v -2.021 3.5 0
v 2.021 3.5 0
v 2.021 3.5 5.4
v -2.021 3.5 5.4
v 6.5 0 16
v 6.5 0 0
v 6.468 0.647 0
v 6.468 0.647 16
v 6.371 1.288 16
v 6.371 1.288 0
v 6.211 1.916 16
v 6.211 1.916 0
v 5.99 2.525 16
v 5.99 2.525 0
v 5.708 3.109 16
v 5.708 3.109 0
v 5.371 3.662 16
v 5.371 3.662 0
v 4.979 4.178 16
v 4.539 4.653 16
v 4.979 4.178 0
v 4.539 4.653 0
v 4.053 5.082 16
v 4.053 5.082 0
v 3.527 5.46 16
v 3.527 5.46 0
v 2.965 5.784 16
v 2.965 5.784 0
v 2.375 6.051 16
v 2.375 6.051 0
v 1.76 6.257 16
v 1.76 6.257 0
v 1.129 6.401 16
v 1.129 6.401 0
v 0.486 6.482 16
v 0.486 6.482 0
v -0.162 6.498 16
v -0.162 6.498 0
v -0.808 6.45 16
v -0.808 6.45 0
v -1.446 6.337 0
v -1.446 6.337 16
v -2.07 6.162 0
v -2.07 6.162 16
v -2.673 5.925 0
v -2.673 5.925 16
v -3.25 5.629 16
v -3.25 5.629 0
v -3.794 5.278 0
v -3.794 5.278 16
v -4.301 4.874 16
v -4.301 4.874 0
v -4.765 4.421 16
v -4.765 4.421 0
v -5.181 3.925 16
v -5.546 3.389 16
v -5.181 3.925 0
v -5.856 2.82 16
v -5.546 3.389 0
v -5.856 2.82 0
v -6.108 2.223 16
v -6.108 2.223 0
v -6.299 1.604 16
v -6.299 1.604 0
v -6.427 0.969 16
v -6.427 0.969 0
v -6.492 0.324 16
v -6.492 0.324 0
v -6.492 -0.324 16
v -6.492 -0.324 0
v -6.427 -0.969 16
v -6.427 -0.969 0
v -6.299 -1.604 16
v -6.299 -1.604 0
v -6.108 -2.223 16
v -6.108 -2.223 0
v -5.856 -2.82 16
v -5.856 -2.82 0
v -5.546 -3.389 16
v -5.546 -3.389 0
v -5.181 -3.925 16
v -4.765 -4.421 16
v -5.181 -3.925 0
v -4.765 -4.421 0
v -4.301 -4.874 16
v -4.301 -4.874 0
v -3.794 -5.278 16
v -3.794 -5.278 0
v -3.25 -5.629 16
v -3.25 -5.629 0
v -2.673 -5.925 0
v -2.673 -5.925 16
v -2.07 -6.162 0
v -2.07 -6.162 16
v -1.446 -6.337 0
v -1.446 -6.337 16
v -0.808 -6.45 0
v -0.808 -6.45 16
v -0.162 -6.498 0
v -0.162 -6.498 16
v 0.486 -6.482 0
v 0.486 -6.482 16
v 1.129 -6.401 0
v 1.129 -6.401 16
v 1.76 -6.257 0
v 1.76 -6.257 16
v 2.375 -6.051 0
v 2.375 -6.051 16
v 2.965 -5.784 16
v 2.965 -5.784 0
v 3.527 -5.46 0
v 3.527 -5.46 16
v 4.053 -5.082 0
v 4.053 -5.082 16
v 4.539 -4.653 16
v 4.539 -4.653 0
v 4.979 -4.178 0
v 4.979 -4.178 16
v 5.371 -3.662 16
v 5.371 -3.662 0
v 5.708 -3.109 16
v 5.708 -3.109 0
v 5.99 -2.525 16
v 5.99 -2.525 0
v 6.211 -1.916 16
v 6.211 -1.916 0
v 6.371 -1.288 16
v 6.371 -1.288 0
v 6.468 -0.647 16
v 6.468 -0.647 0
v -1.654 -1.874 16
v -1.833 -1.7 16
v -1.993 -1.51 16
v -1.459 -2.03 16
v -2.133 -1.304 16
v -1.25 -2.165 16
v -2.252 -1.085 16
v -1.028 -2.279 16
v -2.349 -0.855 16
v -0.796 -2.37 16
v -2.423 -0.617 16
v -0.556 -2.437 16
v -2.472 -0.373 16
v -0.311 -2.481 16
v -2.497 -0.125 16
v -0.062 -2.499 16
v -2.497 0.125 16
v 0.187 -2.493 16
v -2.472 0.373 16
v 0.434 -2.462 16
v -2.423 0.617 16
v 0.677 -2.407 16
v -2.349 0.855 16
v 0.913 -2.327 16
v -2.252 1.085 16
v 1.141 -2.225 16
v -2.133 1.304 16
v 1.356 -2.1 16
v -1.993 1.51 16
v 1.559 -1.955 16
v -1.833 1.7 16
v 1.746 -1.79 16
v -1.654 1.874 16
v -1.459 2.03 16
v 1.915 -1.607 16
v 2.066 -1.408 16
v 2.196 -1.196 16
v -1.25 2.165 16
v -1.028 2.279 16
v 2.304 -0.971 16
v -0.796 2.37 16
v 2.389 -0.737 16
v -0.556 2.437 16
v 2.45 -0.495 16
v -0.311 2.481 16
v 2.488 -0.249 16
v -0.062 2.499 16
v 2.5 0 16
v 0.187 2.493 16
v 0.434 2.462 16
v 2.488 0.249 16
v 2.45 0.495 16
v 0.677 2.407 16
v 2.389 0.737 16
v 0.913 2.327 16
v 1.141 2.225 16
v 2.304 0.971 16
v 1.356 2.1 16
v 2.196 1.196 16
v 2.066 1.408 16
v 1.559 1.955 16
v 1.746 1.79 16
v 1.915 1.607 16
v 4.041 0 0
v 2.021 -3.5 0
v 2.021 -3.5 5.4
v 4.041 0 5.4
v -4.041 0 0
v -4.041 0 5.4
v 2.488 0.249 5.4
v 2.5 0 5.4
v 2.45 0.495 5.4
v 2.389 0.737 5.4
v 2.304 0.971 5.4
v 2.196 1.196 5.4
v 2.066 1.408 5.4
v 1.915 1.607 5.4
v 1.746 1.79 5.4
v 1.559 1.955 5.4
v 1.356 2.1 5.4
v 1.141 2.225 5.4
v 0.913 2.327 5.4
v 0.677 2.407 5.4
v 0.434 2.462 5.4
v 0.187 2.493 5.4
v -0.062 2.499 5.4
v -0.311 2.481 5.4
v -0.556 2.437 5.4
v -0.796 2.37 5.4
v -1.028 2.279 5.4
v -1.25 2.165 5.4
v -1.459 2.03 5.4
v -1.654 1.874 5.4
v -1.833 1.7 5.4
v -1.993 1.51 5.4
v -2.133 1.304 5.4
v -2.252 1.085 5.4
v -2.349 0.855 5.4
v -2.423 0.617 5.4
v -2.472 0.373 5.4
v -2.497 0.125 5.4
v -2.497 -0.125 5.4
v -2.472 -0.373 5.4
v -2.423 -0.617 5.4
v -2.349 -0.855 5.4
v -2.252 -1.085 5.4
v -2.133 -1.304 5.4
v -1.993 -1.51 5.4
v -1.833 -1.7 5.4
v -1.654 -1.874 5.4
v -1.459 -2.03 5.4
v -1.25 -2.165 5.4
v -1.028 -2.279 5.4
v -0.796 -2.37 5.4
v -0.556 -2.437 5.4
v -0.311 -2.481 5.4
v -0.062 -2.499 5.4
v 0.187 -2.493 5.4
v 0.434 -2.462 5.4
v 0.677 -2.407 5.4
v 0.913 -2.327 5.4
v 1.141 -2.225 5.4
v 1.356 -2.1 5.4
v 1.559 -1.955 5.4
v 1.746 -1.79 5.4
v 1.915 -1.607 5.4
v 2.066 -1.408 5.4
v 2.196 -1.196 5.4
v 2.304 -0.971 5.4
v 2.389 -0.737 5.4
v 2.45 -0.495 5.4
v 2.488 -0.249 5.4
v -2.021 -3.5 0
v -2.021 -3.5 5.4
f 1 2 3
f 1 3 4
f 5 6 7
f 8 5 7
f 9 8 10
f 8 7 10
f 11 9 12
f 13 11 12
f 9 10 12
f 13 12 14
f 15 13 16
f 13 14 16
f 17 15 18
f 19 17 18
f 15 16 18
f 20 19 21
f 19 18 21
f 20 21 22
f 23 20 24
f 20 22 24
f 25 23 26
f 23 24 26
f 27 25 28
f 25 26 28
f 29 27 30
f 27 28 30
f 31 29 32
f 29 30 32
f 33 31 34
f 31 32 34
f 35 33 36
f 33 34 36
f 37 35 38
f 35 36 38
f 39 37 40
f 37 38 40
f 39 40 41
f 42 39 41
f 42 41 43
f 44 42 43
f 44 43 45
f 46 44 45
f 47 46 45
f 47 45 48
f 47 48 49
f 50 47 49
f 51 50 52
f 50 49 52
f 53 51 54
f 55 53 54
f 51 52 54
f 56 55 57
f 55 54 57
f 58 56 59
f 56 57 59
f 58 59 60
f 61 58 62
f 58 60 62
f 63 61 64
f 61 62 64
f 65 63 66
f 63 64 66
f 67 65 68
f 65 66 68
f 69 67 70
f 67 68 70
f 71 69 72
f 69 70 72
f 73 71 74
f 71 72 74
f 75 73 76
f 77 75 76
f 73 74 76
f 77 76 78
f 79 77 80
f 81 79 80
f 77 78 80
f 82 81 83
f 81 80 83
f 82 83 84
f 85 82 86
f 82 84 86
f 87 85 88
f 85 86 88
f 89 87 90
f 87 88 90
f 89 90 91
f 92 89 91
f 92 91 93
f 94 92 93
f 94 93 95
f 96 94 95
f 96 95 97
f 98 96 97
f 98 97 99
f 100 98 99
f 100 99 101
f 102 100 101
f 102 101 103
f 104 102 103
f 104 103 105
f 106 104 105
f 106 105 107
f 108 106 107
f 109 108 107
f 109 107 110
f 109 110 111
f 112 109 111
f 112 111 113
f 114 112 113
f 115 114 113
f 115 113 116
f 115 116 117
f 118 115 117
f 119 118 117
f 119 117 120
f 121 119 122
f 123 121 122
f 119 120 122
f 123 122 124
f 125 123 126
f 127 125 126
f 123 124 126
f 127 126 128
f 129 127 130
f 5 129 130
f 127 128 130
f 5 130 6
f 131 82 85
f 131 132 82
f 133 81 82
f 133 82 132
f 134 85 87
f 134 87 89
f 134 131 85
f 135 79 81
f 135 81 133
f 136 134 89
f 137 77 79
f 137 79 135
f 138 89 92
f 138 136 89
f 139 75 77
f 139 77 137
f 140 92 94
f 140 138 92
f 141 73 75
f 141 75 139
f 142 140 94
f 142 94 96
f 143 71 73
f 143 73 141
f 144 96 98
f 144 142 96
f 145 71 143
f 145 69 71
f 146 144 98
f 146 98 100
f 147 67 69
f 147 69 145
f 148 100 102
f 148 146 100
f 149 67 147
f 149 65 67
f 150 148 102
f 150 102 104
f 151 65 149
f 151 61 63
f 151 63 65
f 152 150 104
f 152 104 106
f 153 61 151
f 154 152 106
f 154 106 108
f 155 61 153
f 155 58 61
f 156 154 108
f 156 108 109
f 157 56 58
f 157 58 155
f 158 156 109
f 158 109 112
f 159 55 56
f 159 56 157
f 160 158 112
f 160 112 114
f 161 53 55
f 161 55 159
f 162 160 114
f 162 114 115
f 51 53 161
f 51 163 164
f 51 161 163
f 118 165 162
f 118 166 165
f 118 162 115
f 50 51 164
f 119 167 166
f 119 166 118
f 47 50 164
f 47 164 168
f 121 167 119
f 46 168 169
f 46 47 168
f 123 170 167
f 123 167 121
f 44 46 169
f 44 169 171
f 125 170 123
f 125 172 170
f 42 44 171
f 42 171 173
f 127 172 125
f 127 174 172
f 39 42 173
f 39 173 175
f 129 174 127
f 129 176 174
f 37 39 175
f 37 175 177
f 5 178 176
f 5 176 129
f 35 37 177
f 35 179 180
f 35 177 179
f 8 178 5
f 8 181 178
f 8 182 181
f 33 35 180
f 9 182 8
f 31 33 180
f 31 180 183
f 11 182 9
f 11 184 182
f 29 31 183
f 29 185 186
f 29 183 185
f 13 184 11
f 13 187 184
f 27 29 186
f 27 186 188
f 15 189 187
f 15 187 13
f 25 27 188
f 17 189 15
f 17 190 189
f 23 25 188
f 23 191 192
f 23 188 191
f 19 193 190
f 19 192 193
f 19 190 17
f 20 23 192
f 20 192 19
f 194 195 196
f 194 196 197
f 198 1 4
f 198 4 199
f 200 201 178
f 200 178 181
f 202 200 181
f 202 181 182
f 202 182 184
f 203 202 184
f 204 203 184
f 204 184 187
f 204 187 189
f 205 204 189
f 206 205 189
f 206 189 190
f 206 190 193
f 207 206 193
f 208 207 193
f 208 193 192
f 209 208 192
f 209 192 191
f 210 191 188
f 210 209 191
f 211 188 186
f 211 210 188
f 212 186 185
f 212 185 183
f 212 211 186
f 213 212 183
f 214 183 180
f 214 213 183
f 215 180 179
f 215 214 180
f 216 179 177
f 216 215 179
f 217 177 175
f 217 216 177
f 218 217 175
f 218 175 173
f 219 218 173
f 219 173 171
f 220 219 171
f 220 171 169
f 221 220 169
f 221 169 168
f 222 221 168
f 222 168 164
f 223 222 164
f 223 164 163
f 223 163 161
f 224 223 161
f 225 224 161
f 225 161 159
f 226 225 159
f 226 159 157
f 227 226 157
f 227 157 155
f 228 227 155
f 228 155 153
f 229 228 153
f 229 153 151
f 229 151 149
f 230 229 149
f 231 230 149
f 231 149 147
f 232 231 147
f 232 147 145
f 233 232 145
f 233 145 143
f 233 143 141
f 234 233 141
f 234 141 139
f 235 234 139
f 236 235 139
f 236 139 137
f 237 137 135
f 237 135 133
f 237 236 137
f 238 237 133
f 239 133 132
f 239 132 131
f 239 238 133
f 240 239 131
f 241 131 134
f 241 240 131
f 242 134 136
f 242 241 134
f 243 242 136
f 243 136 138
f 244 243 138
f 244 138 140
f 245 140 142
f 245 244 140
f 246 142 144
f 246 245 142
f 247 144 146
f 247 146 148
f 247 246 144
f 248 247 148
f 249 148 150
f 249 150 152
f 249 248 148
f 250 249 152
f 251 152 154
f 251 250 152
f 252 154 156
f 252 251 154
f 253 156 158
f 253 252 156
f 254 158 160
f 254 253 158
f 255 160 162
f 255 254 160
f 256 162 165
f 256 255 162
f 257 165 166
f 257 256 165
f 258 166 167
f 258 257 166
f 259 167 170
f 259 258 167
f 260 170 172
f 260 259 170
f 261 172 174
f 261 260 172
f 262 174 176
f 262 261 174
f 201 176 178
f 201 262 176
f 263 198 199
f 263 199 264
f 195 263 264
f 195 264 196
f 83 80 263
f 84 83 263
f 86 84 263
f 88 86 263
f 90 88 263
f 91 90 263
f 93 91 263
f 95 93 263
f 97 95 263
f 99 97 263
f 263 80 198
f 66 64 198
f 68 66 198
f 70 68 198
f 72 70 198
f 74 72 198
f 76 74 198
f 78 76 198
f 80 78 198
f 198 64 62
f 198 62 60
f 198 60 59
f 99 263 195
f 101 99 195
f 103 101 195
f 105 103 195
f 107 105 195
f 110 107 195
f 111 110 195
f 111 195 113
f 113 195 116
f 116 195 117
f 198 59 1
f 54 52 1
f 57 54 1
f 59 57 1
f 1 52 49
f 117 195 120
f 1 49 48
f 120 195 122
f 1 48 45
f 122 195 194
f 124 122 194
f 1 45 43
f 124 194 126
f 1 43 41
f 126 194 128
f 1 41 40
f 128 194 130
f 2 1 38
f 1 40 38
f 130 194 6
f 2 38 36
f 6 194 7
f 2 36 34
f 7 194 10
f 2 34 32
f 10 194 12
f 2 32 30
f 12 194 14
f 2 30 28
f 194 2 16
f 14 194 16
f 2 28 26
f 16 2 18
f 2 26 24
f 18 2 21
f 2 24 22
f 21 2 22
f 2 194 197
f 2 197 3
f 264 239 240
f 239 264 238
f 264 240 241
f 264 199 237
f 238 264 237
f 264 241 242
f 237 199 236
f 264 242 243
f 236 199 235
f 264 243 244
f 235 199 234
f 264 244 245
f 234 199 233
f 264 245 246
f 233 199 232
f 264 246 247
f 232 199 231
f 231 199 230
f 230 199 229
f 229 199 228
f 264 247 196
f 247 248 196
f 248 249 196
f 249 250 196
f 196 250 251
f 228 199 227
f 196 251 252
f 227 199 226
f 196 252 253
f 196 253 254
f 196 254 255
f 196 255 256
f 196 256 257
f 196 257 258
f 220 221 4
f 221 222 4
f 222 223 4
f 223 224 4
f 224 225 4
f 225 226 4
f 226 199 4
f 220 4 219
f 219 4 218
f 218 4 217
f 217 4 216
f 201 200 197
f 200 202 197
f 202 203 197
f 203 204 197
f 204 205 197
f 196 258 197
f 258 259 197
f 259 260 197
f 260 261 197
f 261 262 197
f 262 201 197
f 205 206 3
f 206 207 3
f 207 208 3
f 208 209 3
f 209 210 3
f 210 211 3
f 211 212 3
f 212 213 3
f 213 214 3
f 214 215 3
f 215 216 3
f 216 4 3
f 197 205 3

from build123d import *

# Parameters (mm, degrees)
F0_R     = 6.5
F0_R_2   = 2.5
F1_DEPTH = 16
F2_DEPTH = 5.4


with BuildPart() as f1:
    # F0 (on Top) → F1 (new body)
    with BuildSketch(Plane.XY):
        Circle(F0_R)
        Polygon((-4.041452, 0), (-2.020726, 3.5), (2.020726, 3.5), (4.041452, 0), (2.020726, -3.5), (-2.020726, -3.5), align=None, mode=Mode.SUBTRACT)
        Polygon((2.020726, 3.5), (-2.020726, 3.5), (-4.041452, 0), (-2.020726, -3.5), (2.020726, -3.5), (4.041452, 0), align=None)
        Circle(F0_R_2, mode=Mode.SUBTRACT)
    extrude(amount=F1_DEPTH)

    # F0 (on Top) → F2 (cut)
    with BuildSketch(Plane.XY):
        Polygon((2.020726, 3.5), (-2.020726, 3.5), (-4.041452, 0), (-2.020726, -3.5), (2.020726, -3.5), (4.041452, 0), align=None)
        Circle(F0_R_2, mode=Mode.SUBTRACT)
    extrude(amount=F2_DEPTH, mode=Mode.SUBTRACT)


solid = f1.part
